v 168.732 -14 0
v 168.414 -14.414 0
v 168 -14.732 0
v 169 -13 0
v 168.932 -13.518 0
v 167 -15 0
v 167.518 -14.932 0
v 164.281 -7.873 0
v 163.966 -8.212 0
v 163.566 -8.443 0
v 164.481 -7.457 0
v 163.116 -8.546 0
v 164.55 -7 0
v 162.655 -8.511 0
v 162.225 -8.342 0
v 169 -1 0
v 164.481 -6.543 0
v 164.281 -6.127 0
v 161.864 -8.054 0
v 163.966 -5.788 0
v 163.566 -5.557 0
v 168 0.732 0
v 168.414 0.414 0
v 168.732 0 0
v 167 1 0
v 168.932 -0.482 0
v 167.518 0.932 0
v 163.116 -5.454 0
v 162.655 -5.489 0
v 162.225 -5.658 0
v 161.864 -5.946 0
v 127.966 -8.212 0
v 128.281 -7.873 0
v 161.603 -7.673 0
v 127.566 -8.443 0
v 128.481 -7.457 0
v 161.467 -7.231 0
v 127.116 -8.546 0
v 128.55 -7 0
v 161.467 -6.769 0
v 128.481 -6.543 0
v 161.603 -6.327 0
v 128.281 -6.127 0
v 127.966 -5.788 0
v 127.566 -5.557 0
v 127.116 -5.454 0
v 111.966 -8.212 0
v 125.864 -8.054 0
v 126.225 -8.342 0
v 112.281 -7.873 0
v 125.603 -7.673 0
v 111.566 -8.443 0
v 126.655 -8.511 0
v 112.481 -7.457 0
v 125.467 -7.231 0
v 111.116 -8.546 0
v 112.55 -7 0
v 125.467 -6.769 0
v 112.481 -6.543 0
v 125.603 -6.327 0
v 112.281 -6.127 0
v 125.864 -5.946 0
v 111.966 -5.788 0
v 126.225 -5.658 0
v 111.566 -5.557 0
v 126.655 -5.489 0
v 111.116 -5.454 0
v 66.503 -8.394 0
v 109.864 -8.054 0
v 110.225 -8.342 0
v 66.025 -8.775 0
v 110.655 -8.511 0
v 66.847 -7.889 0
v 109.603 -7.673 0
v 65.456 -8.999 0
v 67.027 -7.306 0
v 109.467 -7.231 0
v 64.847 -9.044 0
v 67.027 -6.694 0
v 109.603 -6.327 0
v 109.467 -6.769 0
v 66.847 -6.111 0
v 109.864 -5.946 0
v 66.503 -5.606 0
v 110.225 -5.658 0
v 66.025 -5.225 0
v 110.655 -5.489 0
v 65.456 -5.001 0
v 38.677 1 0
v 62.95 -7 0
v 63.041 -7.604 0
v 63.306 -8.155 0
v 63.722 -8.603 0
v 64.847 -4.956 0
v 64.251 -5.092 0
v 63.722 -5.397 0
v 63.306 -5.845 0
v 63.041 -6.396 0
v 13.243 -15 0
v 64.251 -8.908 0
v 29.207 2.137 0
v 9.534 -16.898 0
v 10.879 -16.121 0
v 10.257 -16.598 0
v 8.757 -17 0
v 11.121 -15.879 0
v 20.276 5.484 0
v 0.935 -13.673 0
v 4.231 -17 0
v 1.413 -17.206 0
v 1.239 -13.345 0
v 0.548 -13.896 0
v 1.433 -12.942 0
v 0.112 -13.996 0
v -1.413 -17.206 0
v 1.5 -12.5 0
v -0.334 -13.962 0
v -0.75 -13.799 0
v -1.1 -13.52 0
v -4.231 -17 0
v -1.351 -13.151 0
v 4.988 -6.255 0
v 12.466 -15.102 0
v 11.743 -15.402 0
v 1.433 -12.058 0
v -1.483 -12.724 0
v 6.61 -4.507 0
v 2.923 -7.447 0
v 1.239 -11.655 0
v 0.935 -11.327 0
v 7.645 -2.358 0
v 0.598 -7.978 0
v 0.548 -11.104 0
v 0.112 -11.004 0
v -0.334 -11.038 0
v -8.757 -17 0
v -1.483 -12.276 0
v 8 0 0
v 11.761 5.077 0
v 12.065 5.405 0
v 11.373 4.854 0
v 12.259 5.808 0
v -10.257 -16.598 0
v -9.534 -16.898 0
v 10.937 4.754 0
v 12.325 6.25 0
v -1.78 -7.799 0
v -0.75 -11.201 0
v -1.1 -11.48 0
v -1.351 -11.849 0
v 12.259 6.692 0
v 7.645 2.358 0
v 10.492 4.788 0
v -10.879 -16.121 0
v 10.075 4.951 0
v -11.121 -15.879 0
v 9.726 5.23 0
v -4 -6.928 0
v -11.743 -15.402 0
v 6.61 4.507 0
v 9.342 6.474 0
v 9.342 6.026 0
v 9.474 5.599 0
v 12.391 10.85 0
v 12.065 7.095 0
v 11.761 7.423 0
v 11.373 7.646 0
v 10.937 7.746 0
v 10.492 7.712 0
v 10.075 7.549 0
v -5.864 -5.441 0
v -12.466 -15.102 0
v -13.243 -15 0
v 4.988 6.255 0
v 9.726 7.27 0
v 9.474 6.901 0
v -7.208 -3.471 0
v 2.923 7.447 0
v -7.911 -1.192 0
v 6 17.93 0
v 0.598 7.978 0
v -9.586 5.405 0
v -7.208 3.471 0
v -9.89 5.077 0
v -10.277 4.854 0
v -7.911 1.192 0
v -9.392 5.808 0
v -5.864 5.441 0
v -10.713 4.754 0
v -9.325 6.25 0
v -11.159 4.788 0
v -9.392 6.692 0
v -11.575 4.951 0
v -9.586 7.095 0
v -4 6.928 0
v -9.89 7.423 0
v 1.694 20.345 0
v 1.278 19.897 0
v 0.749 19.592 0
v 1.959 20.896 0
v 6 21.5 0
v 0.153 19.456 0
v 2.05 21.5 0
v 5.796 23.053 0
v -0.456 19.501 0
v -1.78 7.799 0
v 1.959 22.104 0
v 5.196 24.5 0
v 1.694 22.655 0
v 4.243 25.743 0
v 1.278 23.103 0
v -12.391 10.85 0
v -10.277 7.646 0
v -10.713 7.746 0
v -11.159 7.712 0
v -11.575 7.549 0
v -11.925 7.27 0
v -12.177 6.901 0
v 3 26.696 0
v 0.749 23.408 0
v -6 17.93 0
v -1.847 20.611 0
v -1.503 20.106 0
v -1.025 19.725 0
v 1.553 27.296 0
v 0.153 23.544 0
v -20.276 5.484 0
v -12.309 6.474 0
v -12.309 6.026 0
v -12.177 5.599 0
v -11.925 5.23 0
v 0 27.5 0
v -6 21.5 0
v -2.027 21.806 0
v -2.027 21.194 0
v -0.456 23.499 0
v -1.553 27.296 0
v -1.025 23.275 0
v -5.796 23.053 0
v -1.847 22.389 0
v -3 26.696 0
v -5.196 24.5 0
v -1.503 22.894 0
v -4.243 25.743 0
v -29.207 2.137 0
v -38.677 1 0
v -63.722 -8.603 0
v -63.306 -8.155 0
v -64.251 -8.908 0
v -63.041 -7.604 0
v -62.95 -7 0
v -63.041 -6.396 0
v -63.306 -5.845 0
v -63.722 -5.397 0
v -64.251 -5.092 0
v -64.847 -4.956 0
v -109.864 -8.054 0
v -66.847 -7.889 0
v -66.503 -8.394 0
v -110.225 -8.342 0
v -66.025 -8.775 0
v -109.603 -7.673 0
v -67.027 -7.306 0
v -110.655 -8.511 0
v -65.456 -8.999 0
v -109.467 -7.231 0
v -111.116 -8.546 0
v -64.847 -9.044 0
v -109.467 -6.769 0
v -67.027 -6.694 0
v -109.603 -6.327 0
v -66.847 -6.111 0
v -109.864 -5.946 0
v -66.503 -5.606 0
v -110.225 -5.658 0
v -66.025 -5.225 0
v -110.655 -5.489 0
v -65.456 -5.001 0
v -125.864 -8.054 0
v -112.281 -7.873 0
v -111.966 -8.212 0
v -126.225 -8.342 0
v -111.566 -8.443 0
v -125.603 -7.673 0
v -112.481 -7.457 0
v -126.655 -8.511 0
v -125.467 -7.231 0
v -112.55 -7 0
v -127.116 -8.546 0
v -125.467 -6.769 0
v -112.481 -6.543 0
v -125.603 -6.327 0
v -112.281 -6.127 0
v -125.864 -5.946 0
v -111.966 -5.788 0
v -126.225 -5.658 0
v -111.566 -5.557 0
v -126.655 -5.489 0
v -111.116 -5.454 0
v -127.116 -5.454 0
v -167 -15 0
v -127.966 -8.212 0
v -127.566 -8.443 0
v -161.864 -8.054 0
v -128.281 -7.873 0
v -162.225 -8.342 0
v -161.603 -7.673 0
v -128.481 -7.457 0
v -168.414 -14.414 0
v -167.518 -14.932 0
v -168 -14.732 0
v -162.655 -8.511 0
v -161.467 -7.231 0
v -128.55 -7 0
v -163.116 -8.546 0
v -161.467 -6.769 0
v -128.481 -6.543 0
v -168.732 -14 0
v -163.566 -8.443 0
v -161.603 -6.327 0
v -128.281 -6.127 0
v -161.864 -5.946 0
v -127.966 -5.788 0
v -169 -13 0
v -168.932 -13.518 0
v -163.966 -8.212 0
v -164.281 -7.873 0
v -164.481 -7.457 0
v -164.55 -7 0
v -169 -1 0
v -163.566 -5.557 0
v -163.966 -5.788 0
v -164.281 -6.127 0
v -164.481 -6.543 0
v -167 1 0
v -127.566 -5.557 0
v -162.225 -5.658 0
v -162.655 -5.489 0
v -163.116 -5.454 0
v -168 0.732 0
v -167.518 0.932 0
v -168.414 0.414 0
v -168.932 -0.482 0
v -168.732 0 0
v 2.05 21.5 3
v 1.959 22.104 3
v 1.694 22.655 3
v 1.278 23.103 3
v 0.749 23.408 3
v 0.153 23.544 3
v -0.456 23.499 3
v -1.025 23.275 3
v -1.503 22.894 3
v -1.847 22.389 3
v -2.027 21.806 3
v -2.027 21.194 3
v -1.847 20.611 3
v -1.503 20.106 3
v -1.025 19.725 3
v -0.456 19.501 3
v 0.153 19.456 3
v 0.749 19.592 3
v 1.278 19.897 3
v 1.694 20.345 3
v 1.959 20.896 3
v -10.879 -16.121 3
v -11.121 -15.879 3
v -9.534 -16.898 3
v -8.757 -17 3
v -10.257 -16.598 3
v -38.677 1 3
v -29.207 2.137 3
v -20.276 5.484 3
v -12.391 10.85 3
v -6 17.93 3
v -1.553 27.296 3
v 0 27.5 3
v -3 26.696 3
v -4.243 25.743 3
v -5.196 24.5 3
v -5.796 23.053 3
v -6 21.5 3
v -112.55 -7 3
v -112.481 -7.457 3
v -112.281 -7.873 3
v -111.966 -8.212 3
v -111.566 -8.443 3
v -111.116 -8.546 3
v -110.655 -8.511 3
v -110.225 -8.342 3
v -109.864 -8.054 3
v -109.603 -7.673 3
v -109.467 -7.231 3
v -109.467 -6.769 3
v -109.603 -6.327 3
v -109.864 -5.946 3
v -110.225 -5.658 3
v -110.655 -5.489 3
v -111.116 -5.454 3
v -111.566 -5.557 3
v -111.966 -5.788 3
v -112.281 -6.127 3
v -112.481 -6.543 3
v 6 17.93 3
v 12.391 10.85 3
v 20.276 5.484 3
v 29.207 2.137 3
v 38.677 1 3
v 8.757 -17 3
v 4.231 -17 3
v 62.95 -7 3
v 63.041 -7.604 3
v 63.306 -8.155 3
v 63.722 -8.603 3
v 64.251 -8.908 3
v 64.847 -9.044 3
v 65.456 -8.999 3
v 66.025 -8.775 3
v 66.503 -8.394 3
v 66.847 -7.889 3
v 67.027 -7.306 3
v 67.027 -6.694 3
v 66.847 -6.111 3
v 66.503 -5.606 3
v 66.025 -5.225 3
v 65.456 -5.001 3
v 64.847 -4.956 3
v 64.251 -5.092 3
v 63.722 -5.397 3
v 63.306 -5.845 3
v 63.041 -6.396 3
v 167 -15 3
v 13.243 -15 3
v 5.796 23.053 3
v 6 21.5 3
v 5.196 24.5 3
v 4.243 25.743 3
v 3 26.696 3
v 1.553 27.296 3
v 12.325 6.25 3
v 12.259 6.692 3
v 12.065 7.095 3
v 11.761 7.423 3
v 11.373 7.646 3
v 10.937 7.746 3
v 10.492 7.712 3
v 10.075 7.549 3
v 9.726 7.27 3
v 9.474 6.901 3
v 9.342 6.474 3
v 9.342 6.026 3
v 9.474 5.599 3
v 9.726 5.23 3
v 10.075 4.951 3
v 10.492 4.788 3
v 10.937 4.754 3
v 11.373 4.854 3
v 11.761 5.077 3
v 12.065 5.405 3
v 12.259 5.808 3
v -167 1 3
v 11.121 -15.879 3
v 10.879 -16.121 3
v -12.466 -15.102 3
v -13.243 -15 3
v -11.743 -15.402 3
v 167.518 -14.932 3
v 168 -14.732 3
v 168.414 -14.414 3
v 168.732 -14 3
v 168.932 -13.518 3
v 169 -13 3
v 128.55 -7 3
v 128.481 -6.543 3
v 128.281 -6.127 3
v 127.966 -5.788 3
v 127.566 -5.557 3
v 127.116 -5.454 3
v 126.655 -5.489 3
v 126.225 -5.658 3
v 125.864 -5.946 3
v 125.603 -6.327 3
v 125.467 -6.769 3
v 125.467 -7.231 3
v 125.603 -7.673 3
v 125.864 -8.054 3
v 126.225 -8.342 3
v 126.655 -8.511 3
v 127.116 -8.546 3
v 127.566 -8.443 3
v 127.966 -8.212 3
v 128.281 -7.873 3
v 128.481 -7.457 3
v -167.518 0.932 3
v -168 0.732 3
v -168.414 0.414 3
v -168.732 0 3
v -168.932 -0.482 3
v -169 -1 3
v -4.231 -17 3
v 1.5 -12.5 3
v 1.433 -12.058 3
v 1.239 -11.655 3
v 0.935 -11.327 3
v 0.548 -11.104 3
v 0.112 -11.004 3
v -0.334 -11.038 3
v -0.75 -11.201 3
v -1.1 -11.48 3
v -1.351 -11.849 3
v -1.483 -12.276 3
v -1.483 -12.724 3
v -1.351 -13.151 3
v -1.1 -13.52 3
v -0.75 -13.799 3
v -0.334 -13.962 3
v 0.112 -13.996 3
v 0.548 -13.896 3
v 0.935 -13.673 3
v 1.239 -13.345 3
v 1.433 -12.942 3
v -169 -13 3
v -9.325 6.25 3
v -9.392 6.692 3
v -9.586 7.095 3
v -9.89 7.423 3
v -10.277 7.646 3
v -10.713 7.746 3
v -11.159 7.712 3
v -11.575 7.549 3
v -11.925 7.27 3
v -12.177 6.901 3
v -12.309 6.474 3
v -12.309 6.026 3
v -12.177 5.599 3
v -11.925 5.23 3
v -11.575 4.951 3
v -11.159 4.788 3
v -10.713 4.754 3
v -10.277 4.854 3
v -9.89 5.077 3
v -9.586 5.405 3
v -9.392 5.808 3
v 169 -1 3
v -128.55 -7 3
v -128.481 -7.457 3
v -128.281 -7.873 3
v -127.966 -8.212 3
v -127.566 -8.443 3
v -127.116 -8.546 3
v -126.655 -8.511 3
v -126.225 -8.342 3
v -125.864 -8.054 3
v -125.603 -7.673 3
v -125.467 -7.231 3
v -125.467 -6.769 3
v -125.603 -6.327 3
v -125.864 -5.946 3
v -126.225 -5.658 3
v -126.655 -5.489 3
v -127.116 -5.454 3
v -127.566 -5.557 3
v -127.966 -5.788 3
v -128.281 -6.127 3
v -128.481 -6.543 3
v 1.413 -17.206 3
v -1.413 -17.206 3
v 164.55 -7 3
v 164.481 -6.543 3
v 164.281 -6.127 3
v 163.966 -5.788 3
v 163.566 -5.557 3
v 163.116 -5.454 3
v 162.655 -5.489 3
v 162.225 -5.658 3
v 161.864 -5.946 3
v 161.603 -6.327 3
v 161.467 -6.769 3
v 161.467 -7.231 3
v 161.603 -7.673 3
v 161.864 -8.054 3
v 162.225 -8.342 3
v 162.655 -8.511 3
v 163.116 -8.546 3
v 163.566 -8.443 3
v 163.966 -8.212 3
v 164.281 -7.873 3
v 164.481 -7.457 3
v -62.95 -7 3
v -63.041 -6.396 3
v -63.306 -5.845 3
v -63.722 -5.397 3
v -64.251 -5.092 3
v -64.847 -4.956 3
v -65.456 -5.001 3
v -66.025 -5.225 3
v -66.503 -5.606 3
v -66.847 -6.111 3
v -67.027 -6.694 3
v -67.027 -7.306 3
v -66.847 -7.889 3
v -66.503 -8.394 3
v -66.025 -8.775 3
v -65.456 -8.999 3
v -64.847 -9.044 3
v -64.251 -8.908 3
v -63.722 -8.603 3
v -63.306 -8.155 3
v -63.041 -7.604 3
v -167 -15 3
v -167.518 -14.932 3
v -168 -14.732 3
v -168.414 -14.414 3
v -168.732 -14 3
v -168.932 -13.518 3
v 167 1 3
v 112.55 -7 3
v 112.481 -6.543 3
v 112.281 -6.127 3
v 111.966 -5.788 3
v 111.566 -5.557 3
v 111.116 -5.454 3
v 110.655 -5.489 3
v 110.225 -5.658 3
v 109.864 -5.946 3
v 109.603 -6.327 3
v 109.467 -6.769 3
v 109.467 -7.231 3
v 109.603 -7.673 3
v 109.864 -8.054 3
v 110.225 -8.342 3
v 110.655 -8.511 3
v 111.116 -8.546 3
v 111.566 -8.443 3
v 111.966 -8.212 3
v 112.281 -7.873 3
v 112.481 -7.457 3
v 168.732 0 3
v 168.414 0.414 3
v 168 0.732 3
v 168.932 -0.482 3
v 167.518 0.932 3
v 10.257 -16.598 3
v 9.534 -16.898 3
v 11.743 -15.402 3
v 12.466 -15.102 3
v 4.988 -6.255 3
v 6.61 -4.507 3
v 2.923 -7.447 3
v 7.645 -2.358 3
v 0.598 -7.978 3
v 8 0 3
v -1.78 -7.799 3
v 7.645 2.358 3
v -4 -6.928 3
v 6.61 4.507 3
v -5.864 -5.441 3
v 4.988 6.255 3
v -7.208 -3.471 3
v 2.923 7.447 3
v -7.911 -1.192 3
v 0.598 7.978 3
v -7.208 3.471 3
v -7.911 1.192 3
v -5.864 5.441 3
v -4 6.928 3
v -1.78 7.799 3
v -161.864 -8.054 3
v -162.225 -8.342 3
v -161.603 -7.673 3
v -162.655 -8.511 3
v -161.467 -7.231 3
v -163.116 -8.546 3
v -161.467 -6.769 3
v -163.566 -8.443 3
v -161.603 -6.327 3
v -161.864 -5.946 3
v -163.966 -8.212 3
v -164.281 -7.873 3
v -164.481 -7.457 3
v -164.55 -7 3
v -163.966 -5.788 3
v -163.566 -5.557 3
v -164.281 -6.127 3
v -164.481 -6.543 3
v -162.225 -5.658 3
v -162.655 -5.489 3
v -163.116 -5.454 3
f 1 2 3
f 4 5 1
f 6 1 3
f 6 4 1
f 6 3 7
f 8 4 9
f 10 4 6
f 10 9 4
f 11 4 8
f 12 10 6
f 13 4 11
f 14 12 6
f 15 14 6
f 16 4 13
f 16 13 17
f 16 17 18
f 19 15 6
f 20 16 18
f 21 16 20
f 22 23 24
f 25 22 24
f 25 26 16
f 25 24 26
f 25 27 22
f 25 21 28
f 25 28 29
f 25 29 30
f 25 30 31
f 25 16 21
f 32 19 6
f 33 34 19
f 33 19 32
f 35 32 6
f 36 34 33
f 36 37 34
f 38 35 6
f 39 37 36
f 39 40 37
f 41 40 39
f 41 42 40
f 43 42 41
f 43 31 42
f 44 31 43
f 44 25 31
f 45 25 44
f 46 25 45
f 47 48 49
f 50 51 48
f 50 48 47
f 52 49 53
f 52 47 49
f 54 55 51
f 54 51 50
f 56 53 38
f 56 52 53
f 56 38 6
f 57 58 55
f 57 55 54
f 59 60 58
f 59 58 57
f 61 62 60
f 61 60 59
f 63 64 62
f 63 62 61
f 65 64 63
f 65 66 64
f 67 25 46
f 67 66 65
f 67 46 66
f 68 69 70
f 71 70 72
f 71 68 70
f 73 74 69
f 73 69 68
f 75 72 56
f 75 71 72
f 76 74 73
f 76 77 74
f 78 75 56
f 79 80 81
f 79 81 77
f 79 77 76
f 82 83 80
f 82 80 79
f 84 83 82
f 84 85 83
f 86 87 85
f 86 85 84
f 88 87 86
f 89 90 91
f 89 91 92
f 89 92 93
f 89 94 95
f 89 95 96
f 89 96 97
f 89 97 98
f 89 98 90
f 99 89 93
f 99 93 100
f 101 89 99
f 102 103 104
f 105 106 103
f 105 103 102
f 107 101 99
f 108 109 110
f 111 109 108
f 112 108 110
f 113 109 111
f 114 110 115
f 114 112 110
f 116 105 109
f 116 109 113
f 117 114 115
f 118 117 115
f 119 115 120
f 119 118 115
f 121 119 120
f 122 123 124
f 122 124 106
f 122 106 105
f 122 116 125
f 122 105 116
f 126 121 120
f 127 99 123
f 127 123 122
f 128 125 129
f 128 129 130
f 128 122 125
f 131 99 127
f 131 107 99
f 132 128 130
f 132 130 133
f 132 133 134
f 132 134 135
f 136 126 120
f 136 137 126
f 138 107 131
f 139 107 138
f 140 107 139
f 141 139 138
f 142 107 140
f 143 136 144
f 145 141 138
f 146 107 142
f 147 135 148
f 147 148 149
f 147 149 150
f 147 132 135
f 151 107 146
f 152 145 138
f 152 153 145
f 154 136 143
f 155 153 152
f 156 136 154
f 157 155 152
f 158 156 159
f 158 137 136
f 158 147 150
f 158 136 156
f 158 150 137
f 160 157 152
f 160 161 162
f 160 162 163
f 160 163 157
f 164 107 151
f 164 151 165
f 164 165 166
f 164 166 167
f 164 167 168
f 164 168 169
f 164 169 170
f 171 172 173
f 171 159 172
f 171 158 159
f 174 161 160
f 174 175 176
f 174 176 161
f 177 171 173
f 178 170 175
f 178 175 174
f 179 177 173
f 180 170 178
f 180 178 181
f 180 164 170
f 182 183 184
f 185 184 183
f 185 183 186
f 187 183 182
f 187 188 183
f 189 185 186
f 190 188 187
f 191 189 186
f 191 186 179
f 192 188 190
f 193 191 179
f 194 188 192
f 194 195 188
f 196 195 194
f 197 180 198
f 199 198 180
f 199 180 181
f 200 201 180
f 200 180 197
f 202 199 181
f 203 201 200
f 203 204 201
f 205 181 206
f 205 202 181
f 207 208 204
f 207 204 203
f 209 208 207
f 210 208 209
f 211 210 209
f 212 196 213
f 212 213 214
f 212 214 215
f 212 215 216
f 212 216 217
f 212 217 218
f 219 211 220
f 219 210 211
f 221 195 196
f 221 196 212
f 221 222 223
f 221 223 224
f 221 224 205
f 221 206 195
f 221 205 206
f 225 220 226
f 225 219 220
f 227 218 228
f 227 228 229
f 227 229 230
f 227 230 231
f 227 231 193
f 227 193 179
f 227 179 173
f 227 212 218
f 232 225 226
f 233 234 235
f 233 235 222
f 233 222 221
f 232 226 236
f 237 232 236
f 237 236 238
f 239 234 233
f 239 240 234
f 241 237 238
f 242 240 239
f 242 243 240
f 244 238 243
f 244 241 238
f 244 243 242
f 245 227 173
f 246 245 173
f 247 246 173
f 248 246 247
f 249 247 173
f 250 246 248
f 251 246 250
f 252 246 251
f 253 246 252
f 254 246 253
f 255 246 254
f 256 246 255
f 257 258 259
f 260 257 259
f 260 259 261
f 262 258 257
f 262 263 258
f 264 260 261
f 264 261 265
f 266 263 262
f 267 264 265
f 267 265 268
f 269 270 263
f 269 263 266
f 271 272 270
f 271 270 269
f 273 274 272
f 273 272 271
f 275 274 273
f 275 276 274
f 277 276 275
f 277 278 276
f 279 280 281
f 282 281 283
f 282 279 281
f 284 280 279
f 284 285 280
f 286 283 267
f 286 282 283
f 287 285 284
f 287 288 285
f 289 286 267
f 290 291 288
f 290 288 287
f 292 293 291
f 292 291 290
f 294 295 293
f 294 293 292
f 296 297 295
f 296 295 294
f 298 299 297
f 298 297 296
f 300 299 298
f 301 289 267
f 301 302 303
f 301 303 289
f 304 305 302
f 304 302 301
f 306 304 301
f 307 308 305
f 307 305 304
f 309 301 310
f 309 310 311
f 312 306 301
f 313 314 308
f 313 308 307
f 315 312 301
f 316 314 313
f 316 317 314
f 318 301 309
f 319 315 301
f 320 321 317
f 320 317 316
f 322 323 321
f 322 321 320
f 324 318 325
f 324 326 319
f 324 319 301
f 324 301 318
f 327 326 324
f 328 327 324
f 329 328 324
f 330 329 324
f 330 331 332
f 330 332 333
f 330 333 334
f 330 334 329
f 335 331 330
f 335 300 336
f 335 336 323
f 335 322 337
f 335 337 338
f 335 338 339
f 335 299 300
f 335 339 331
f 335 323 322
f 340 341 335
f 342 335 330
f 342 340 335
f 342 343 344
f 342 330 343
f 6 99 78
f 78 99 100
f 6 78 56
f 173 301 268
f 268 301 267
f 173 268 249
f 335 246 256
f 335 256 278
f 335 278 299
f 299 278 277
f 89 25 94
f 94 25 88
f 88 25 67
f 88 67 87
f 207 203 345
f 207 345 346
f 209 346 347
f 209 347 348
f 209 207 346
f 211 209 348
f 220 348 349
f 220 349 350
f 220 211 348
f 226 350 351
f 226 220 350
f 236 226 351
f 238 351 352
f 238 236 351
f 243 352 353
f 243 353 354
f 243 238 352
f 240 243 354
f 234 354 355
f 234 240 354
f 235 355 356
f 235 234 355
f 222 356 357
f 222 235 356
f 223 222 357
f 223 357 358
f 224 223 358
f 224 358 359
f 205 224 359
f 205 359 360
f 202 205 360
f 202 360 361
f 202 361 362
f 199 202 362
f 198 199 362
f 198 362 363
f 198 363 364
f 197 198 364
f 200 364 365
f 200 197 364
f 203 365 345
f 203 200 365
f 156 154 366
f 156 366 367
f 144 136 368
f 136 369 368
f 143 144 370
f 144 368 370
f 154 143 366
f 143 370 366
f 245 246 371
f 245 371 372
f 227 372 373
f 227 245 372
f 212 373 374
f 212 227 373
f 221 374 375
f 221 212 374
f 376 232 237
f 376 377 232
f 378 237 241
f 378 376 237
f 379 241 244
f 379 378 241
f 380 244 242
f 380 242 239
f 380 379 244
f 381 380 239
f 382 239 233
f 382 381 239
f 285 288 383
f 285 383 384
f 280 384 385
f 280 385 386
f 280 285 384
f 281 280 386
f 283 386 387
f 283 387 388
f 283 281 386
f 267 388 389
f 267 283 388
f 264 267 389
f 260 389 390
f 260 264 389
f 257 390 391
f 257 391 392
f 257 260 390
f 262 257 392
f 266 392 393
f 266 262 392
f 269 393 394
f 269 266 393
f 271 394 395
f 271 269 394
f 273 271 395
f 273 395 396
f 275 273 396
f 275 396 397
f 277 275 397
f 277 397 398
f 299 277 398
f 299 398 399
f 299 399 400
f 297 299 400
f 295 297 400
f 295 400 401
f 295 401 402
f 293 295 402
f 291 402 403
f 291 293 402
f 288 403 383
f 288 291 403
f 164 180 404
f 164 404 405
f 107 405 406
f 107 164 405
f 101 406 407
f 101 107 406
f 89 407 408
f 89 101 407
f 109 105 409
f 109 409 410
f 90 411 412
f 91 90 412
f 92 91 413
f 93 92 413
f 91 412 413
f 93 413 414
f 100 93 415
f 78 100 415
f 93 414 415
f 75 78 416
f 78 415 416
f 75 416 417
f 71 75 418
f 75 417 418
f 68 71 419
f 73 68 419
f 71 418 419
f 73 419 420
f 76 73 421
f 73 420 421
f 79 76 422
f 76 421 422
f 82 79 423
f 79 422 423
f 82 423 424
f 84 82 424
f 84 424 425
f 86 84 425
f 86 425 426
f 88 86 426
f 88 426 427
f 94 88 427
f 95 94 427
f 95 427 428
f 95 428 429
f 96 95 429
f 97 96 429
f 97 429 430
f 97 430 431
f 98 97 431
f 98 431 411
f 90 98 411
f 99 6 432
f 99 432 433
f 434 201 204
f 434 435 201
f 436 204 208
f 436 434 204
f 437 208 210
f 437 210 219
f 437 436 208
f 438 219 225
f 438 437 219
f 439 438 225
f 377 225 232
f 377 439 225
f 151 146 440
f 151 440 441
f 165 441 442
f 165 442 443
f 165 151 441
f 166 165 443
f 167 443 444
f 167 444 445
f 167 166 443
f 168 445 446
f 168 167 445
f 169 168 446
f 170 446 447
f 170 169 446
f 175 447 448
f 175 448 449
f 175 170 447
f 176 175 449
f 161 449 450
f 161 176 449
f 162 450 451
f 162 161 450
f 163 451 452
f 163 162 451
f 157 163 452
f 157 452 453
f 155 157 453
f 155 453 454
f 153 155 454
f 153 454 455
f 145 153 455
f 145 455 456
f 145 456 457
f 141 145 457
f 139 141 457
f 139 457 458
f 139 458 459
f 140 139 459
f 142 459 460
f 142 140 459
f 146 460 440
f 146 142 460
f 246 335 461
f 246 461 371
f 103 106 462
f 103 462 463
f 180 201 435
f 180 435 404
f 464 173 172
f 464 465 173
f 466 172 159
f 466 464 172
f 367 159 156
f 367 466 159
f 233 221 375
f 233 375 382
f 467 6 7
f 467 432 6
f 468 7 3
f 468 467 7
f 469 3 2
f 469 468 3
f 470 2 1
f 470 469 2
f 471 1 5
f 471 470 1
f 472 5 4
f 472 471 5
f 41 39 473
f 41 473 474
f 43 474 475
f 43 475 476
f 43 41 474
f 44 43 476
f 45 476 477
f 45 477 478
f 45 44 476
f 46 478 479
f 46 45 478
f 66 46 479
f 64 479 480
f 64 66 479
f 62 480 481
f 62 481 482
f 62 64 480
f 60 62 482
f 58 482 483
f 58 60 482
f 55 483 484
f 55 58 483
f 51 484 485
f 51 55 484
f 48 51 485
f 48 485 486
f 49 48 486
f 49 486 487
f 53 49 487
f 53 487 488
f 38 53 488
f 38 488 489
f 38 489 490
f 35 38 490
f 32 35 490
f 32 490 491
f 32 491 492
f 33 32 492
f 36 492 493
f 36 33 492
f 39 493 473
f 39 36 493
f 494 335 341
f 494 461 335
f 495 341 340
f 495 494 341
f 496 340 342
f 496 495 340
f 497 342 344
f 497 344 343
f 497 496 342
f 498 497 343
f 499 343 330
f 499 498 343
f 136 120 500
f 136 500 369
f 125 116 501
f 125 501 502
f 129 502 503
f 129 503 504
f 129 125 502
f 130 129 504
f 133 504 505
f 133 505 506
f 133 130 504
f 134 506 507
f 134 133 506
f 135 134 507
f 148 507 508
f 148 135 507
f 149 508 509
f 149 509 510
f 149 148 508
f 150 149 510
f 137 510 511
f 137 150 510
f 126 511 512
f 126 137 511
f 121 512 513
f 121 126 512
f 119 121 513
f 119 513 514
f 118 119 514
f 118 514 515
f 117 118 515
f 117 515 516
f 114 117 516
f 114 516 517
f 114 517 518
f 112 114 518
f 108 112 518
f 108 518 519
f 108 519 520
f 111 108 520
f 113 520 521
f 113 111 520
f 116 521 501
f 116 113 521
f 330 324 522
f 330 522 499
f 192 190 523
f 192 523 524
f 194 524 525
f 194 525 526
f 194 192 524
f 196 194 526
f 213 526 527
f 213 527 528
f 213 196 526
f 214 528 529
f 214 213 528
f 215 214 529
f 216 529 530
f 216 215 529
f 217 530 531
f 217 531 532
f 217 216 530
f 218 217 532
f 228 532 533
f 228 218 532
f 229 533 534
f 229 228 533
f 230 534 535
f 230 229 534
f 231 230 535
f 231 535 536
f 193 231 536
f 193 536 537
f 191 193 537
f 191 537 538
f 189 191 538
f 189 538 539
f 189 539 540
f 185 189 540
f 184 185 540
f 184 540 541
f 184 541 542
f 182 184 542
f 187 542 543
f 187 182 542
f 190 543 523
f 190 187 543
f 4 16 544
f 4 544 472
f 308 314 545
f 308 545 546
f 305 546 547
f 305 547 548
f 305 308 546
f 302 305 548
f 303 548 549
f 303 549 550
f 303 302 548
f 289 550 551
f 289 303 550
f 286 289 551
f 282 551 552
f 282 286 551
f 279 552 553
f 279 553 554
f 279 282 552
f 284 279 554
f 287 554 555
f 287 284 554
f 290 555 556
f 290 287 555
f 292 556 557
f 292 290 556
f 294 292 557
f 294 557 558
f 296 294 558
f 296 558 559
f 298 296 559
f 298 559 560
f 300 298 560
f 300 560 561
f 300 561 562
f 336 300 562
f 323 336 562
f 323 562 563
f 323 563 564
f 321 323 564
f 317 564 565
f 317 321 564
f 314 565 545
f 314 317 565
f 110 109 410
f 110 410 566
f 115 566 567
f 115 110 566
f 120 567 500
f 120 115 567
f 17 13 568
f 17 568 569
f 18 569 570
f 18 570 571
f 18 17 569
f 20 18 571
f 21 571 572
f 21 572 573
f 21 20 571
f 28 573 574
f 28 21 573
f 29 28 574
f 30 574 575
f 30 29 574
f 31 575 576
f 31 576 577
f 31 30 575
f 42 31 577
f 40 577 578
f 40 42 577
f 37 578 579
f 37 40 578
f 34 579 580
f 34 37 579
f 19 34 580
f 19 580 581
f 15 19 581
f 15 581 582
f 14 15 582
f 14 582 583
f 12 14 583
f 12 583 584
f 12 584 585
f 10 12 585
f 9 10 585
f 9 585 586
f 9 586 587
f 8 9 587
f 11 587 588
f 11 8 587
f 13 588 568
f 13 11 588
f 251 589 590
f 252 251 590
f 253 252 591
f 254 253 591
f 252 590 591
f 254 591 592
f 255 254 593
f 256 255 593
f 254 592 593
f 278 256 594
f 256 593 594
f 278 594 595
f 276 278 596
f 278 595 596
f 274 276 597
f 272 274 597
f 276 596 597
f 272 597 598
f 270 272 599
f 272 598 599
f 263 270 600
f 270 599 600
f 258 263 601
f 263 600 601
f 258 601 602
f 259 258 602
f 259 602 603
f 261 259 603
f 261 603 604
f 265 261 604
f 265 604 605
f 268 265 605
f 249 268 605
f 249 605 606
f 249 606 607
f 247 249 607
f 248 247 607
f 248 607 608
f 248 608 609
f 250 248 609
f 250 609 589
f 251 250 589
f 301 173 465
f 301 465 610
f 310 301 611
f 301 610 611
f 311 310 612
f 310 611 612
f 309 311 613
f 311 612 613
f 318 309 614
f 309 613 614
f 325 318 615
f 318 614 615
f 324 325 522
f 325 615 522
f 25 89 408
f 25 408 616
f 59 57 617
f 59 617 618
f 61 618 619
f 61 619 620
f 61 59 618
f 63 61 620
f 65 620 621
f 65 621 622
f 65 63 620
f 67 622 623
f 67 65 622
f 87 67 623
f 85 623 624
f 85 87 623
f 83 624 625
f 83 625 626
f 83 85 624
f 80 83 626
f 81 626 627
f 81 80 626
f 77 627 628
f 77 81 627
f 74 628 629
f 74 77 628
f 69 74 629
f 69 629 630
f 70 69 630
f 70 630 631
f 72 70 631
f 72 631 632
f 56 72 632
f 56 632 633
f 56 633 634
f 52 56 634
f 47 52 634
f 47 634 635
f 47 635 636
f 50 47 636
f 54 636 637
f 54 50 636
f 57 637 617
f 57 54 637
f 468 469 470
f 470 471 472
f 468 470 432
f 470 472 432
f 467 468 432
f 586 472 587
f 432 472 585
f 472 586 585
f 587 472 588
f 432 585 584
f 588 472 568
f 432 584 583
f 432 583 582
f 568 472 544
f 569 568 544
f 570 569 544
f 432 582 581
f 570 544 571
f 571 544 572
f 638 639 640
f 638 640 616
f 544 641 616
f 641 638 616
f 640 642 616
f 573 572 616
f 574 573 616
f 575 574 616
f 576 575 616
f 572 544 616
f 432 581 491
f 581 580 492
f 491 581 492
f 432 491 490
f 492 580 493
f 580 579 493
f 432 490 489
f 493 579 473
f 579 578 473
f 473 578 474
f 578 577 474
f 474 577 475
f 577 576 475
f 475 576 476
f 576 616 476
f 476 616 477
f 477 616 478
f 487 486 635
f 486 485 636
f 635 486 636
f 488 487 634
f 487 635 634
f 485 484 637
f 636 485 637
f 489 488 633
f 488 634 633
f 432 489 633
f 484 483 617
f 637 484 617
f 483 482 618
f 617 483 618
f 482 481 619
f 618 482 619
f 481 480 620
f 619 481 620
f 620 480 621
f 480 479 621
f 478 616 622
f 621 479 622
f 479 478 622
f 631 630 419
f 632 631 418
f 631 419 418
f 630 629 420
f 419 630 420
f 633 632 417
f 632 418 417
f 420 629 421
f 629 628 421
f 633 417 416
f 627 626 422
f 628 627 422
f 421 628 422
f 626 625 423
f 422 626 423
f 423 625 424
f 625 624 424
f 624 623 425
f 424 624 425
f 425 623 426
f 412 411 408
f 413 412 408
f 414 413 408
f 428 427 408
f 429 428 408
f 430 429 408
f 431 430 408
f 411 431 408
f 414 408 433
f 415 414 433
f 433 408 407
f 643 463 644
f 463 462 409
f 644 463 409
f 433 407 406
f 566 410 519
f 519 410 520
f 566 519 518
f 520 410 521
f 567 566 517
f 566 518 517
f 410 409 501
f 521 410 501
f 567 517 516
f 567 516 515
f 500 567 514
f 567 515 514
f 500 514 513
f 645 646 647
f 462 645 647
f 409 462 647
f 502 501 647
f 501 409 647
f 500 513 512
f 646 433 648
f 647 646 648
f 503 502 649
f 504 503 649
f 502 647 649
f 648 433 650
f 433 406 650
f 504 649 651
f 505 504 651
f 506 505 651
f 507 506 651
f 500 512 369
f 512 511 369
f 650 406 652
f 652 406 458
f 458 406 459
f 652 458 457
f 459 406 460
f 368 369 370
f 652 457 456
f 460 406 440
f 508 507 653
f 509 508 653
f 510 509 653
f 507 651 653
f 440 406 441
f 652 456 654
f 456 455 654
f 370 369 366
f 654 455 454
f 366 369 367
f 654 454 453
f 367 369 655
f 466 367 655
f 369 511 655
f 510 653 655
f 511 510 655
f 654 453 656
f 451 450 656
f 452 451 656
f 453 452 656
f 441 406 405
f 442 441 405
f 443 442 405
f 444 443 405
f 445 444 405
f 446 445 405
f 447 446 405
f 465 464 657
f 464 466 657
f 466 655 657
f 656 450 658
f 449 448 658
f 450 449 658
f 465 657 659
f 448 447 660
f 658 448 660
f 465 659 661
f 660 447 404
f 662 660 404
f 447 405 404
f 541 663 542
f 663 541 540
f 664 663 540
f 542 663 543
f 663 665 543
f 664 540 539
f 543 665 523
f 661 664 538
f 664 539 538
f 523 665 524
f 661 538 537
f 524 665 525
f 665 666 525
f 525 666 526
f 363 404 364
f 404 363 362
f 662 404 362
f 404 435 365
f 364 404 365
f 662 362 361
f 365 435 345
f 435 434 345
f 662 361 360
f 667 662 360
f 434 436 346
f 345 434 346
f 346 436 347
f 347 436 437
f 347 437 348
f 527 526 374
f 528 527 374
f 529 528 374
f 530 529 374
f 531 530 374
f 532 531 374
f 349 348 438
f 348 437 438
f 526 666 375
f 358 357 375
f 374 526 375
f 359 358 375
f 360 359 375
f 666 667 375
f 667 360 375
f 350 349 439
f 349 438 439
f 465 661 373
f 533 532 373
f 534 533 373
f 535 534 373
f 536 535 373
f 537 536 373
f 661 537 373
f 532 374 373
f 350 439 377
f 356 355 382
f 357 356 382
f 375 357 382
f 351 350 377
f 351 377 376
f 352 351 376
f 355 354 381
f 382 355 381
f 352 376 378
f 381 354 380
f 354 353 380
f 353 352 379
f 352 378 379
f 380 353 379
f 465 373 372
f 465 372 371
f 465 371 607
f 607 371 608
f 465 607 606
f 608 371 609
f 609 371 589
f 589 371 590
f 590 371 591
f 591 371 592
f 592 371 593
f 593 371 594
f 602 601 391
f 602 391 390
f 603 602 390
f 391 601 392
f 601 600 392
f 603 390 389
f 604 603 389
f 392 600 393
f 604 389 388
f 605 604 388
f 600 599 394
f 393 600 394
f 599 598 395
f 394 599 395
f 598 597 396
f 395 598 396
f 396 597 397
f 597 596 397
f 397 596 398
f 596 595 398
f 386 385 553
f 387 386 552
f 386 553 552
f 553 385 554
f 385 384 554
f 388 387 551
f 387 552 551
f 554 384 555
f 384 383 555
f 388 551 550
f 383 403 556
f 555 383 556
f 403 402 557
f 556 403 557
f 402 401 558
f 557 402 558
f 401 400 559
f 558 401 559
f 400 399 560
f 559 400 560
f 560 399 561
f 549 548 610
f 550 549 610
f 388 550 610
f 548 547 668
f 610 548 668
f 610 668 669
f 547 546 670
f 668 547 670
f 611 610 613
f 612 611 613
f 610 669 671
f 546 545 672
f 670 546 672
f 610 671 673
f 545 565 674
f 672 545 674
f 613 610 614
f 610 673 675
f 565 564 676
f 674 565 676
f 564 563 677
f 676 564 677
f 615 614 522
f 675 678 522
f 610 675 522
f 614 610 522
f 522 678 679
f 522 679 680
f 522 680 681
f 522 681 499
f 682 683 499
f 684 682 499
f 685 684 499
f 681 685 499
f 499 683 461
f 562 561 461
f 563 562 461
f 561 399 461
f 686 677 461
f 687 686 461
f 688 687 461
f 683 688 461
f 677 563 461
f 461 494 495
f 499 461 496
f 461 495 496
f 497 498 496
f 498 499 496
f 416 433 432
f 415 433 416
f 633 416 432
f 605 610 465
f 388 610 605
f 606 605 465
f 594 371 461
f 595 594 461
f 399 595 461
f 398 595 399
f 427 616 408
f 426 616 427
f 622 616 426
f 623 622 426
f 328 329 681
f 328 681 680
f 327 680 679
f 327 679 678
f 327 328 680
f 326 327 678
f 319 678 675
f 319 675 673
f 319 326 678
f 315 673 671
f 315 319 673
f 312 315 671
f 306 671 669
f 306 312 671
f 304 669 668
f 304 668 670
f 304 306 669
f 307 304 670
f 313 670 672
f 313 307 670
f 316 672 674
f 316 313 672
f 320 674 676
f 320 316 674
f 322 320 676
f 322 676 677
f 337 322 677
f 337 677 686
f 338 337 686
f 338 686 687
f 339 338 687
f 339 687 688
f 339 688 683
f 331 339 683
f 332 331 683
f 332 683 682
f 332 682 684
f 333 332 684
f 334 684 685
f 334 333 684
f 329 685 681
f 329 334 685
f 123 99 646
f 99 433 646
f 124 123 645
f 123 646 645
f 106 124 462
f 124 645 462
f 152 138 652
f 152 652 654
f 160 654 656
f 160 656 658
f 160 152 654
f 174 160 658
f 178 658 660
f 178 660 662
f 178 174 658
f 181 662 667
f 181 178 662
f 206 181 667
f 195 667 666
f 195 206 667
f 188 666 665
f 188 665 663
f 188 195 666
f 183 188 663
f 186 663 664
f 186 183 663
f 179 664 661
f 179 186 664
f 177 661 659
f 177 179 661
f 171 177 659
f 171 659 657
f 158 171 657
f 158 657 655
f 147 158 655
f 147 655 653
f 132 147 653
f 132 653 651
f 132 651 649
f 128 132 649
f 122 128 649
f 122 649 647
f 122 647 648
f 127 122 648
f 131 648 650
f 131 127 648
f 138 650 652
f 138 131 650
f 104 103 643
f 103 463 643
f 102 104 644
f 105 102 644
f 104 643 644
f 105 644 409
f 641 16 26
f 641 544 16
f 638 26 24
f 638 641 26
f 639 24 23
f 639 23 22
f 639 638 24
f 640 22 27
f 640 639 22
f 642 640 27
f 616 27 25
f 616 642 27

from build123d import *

# Parameters (mm, degrees)
SKETCH_8_R          = 8
SKETCH_8_R_2        = 1.5
SKETCH_8_R_3        = 1.55
SKETCH_8_R_4        = 2.05
EXTRUDE_2522_DEPTH  = 3
FILLET_27_R         = 6
FILLET_30_R         = 3
FILLET_31_R         = 2
SKETCH_9_R          = 2.05
CUT_EXTRUDE_1_DEPTH = 172.249087589


with BuildPart() as part:
    # Эскиз8 → Extrude 2522 (new body)
    with BuildSketch(Plane.XY):
        with BuildLine():
            Line((38.676576093, 1), (169, 1))
            Line((169, 1), (169, -15))
            Line((169, -15), (90, -15))
            Line((90, -15), (12, -15))
            Line((12, -15), (10, -17))
            Line((10, -17), (4.230786919, -17))
            ThreePointArc((4.230786919, -17), (0, -17.231764199), (-4.230786919, -17))
            Line((-4.230786919, -17), (-10, -17))
            Line((-10, -17), (-12, -15))
            Line((-12, -15), (-90, -15))
            Line((-90, -15), (-169, -15))
            Line((-169, -15), (-169, 1))
            Line((-169, 1), (-38.676576093, 1))
            ThreePointArc((-38.676576093, 1), (-20.275683212, 5.483705976), (-6, 17.929642941))
            Line((-6, 17.929642941), (-6, 27.5))
            Line((-6, 27.5), (6, 27.5))
            Line((6, 27.5), (6, 17.929642941))
            ThreePointArc((6, 17.929642941), (20.275683212, 5.483705976), (38.676576093, 1))
        make_face()
        Circle(SKETCH_8_R, mode=Mode.SUBTRACT)
        with Locations((0, -12.5)):
            Circle(SKETCH_8_R_2, mode=Mode.SUBTRACT)
        with Locations((163, -7)):
            Circle(SKETCH_8_R_3, mode=Mode.SUBTRACT)
        with Locations((111, -7)):
            Circle(SKETCH_8_R_3, mode=Mode.SUBTRACT)
        with Locations((0, 21.5)):
            Circle(SKETCH_8_R_4, mode=Mode.SUBTRACT)
        with Locations((127, -7)):
            Circle(SKETCH_8_R_3, mode=Mode.SUBTRACT)
        with Locations((-10.825317547, 6.25)):
            Circle(SKETCH_8_R_2, mode=Mode.SUBTRACT)
        with Locations((10.825317547, 6.25)):
            Circle(SKETCH_8_R_2, mode=Mode.SUBTRACT)
        with Locations(Location((-127, -7, 0), (0, 0, 180))):
            Circle(SKETCH_8_R_3, mode=Mode.SUBTRACT)
        with Locations(Location((-111, -7, 0), (0, 0, 180))):
            Circle(SKETCH_8_R_3, mode=Mode.SUBTRACT)
        with Locations(Location((-163, -7, 0), (0, 0, 180))):
            Circle(SKETCH_8_R_3, mode=Mode.SUBTRACT)
    extrude(amount=EXTRUDE_2522_DEPTH)

    # Скругление27
    fillet_27_edges = [part.edges().sort_by_distance(p)[0] for p in [
        (-6, 27.5, 1.5),
        (6, 27.5, 1.5),
    ]]
    fillet(fillet_27_edges, radius=FILLET_27_R - 0.0001)  # a hair under: the kernel refuses the full size

    # Скругление30
    fillet_30_edges = [part.edges().sort_by_distance(p)[0] for p in [
        (12, -15, 1.5),
        (10, -17, 1.5),
        (-10, -17, 1.5),
        (-12, -15, 1.5),
    ]]
    fillet(fillet_30_edges, radius=FILLET_30_R)

    # Скругление31
    fillet_31_edges = [part.edges().sort_by_distance(p)[0] for p in [
        (169, 1, 1.5),
        (169, -15, 1.5),
        (-169, -15, 1.5),
        (-169, 1, 1.5),
    ]]
    fillet(fillet_31_edges, radius=FILLET_31_R)

    # Эскиз9 → Вырез-Вытянуть1 (cut, through all)
    with BuildSketch(Plane.XY.offset(3)):
        with Locations((-65, -7)):
            Circle(SKETCH_9_R)
        with Locations(Location((65, -7, 0), (0, 0, 180))):
            Circle(SKETCH_9_R)
    extrude(amount=-CUT_EXTRUDE_1_DEPTH, mode=Mode.SUBTRACT)


solid = part.part
